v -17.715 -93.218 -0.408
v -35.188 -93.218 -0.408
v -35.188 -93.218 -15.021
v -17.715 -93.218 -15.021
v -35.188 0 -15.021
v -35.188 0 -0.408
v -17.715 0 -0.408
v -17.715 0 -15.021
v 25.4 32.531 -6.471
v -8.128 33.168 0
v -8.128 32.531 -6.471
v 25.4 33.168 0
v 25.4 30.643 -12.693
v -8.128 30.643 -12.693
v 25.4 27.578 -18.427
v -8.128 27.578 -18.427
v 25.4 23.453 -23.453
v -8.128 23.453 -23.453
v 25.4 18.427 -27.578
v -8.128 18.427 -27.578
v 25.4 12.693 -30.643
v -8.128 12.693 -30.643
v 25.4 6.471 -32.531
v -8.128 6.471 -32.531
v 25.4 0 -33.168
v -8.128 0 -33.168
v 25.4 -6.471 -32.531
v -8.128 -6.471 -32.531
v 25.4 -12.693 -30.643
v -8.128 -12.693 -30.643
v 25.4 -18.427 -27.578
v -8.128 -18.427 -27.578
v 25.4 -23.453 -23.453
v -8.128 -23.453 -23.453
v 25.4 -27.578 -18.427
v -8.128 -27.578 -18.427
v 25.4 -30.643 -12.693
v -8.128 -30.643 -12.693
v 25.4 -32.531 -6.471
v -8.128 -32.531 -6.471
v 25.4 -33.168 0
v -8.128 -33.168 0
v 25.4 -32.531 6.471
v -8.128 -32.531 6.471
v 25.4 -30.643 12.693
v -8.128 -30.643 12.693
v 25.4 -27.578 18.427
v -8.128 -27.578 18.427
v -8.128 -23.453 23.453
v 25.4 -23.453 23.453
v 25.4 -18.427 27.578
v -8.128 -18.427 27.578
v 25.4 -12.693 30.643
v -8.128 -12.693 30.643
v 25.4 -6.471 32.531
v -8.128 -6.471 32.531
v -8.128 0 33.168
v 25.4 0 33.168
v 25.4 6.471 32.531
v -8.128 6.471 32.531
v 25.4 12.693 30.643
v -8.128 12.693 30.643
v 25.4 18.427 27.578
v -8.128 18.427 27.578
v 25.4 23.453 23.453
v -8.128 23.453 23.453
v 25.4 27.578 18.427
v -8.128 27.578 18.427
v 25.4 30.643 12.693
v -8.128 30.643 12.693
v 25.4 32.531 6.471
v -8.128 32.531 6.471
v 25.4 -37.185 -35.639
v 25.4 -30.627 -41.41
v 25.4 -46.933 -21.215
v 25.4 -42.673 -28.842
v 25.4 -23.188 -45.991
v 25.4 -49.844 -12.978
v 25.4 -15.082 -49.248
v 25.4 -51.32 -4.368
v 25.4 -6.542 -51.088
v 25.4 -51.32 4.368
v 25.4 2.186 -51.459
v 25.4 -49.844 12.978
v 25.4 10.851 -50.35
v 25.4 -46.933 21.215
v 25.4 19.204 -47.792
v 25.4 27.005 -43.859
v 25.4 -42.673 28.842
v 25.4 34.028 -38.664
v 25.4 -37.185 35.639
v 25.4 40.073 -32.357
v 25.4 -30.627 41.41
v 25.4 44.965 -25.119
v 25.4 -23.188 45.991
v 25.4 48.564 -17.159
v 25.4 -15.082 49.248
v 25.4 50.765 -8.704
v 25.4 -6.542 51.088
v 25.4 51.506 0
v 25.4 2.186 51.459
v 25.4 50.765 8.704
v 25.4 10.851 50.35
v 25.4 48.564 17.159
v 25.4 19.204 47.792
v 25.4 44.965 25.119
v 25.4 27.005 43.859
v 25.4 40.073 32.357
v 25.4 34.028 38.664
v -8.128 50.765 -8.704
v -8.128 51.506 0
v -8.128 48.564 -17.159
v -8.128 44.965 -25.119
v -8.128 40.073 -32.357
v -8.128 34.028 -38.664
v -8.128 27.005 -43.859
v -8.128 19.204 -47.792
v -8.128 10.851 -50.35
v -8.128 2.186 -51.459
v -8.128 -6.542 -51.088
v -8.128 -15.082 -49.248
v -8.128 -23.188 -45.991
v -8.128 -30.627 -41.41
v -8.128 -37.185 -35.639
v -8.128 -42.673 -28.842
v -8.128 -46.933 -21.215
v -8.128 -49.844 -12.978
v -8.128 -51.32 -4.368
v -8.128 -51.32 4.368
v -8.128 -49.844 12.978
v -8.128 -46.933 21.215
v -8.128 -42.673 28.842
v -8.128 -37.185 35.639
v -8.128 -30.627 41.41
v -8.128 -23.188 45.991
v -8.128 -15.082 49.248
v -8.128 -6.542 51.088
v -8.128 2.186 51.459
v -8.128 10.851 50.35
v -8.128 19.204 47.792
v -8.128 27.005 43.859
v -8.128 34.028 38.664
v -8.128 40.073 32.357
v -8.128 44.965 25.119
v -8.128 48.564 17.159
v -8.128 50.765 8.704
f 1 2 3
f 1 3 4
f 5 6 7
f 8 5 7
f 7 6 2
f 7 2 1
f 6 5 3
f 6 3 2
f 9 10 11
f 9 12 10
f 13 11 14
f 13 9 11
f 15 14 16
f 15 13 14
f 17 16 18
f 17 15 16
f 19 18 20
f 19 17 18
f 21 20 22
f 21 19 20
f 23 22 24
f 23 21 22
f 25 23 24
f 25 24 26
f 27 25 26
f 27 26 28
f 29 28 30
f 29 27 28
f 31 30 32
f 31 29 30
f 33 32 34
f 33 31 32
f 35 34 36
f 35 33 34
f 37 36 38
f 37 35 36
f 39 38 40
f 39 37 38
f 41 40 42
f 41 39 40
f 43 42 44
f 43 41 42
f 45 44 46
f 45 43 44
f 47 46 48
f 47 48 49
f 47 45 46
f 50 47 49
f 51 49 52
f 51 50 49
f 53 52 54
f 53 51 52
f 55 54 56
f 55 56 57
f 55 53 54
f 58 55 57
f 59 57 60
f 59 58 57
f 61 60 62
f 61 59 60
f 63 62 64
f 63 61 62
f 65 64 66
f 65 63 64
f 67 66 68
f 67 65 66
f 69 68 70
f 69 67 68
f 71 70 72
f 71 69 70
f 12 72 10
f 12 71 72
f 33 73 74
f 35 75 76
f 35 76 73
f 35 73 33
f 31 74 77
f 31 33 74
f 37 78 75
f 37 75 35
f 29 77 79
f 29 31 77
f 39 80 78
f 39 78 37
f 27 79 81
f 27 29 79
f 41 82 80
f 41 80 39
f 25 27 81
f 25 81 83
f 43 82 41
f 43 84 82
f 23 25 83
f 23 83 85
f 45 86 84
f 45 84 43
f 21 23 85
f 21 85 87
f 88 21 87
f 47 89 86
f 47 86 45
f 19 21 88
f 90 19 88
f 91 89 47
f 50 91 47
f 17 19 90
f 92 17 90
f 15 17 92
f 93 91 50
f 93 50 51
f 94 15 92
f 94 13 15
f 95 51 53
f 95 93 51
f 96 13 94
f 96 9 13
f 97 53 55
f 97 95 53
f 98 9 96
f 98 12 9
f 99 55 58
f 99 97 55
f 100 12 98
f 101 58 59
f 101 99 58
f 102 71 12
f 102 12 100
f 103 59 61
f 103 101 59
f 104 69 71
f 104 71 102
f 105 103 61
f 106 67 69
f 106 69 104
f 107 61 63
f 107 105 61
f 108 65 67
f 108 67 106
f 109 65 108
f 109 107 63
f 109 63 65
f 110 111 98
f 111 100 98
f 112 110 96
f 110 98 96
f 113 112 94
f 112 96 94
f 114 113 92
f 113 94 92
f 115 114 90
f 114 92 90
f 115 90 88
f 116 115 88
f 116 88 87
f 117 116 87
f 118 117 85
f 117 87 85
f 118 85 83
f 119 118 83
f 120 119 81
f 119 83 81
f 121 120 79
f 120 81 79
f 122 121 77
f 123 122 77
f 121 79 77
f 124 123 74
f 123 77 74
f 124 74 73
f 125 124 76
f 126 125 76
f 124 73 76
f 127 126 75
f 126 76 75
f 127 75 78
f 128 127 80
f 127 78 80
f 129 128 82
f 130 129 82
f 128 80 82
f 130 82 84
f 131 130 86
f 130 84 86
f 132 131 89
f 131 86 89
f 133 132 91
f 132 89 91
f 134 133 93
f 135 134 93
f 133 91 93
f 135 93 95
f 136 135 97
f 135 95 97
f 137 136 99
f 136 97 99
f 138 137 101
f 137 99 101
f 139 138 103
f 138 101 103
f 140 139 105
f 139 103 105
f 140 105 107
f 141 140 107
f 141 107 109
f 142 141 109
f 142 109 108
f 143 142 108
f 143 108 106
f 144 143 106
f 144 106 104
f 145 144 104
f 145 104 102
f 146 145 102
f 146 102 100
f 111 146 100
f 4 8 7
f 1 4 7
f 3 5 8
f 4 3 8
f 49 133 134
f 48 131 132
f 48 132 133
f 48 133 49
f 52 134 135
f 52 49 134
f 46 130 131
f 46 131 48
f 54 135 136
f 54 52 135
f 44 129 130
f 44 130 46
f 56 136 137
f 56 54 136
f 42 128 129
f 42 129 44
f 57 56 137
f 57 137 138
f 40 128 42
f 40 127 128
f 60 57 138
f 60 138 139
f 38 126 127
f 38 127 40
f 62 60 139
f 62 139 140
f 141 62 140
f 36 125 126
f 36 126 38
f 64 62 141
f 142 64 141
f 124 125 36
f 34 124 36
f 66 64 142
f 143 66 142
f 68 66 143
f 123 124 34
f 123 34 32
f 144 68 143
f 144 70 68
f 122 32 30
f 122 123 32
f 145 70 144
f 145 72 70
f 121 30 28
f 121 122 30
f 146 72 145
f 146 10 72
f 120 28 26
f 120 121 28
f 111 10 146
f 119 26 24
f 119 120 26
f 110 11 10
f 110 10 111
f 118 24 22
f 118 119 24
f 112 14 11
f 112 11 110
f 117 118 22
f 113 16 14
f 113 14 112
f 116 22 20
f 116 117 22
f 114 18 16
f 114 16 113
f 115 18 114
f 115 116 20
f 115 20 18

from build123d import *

# Parameters (mm, degrees)
F0_R        = 51.505643
F0_R_2      = 33.167838
F1_DEPTH    = 25.4
F1_FACE_R   = 51.505643
F1_FACE_R_2 = 33.167838
F2_DEPTH    = 8.128
F3_W        = 17.472986
F3_H        = 14.613089
F4_DEPTH    = 93.218


with BuildPart() as f1:
    # F0 (on Right) → F1 (new body)
    with BuildSketch(Plane.YZ):
        Circle(F0_R)
        Circle(F0_R_2, mode=Mode.SUBTRACT)
    extrude(amount=F1_DEPTH)

    # F1_face (on face) → F2 (join)
    with BuildSketch(Plane(origin=(0, 0, 0), x_dir=(0, 1, 0), z_dir=(-1, 0, 0))):
        Circle(F1_FACE_R)
        Circle(F1_FACE_R_2, mode=Mode.SUBTRACT)
    extrude(amount=F2_DEPTH)


with BuildPart() as f4:
    # F3 (on Front) → F4 (new body)
    with BuildSketch(Plane.XZ):
        with Locations((-26.451938, -7.714074)):
            Rectangle(F3_W, F3_H)
    extrude(amount=F4_DEPTH)


solid = Compound([f1.part, f4.part])
